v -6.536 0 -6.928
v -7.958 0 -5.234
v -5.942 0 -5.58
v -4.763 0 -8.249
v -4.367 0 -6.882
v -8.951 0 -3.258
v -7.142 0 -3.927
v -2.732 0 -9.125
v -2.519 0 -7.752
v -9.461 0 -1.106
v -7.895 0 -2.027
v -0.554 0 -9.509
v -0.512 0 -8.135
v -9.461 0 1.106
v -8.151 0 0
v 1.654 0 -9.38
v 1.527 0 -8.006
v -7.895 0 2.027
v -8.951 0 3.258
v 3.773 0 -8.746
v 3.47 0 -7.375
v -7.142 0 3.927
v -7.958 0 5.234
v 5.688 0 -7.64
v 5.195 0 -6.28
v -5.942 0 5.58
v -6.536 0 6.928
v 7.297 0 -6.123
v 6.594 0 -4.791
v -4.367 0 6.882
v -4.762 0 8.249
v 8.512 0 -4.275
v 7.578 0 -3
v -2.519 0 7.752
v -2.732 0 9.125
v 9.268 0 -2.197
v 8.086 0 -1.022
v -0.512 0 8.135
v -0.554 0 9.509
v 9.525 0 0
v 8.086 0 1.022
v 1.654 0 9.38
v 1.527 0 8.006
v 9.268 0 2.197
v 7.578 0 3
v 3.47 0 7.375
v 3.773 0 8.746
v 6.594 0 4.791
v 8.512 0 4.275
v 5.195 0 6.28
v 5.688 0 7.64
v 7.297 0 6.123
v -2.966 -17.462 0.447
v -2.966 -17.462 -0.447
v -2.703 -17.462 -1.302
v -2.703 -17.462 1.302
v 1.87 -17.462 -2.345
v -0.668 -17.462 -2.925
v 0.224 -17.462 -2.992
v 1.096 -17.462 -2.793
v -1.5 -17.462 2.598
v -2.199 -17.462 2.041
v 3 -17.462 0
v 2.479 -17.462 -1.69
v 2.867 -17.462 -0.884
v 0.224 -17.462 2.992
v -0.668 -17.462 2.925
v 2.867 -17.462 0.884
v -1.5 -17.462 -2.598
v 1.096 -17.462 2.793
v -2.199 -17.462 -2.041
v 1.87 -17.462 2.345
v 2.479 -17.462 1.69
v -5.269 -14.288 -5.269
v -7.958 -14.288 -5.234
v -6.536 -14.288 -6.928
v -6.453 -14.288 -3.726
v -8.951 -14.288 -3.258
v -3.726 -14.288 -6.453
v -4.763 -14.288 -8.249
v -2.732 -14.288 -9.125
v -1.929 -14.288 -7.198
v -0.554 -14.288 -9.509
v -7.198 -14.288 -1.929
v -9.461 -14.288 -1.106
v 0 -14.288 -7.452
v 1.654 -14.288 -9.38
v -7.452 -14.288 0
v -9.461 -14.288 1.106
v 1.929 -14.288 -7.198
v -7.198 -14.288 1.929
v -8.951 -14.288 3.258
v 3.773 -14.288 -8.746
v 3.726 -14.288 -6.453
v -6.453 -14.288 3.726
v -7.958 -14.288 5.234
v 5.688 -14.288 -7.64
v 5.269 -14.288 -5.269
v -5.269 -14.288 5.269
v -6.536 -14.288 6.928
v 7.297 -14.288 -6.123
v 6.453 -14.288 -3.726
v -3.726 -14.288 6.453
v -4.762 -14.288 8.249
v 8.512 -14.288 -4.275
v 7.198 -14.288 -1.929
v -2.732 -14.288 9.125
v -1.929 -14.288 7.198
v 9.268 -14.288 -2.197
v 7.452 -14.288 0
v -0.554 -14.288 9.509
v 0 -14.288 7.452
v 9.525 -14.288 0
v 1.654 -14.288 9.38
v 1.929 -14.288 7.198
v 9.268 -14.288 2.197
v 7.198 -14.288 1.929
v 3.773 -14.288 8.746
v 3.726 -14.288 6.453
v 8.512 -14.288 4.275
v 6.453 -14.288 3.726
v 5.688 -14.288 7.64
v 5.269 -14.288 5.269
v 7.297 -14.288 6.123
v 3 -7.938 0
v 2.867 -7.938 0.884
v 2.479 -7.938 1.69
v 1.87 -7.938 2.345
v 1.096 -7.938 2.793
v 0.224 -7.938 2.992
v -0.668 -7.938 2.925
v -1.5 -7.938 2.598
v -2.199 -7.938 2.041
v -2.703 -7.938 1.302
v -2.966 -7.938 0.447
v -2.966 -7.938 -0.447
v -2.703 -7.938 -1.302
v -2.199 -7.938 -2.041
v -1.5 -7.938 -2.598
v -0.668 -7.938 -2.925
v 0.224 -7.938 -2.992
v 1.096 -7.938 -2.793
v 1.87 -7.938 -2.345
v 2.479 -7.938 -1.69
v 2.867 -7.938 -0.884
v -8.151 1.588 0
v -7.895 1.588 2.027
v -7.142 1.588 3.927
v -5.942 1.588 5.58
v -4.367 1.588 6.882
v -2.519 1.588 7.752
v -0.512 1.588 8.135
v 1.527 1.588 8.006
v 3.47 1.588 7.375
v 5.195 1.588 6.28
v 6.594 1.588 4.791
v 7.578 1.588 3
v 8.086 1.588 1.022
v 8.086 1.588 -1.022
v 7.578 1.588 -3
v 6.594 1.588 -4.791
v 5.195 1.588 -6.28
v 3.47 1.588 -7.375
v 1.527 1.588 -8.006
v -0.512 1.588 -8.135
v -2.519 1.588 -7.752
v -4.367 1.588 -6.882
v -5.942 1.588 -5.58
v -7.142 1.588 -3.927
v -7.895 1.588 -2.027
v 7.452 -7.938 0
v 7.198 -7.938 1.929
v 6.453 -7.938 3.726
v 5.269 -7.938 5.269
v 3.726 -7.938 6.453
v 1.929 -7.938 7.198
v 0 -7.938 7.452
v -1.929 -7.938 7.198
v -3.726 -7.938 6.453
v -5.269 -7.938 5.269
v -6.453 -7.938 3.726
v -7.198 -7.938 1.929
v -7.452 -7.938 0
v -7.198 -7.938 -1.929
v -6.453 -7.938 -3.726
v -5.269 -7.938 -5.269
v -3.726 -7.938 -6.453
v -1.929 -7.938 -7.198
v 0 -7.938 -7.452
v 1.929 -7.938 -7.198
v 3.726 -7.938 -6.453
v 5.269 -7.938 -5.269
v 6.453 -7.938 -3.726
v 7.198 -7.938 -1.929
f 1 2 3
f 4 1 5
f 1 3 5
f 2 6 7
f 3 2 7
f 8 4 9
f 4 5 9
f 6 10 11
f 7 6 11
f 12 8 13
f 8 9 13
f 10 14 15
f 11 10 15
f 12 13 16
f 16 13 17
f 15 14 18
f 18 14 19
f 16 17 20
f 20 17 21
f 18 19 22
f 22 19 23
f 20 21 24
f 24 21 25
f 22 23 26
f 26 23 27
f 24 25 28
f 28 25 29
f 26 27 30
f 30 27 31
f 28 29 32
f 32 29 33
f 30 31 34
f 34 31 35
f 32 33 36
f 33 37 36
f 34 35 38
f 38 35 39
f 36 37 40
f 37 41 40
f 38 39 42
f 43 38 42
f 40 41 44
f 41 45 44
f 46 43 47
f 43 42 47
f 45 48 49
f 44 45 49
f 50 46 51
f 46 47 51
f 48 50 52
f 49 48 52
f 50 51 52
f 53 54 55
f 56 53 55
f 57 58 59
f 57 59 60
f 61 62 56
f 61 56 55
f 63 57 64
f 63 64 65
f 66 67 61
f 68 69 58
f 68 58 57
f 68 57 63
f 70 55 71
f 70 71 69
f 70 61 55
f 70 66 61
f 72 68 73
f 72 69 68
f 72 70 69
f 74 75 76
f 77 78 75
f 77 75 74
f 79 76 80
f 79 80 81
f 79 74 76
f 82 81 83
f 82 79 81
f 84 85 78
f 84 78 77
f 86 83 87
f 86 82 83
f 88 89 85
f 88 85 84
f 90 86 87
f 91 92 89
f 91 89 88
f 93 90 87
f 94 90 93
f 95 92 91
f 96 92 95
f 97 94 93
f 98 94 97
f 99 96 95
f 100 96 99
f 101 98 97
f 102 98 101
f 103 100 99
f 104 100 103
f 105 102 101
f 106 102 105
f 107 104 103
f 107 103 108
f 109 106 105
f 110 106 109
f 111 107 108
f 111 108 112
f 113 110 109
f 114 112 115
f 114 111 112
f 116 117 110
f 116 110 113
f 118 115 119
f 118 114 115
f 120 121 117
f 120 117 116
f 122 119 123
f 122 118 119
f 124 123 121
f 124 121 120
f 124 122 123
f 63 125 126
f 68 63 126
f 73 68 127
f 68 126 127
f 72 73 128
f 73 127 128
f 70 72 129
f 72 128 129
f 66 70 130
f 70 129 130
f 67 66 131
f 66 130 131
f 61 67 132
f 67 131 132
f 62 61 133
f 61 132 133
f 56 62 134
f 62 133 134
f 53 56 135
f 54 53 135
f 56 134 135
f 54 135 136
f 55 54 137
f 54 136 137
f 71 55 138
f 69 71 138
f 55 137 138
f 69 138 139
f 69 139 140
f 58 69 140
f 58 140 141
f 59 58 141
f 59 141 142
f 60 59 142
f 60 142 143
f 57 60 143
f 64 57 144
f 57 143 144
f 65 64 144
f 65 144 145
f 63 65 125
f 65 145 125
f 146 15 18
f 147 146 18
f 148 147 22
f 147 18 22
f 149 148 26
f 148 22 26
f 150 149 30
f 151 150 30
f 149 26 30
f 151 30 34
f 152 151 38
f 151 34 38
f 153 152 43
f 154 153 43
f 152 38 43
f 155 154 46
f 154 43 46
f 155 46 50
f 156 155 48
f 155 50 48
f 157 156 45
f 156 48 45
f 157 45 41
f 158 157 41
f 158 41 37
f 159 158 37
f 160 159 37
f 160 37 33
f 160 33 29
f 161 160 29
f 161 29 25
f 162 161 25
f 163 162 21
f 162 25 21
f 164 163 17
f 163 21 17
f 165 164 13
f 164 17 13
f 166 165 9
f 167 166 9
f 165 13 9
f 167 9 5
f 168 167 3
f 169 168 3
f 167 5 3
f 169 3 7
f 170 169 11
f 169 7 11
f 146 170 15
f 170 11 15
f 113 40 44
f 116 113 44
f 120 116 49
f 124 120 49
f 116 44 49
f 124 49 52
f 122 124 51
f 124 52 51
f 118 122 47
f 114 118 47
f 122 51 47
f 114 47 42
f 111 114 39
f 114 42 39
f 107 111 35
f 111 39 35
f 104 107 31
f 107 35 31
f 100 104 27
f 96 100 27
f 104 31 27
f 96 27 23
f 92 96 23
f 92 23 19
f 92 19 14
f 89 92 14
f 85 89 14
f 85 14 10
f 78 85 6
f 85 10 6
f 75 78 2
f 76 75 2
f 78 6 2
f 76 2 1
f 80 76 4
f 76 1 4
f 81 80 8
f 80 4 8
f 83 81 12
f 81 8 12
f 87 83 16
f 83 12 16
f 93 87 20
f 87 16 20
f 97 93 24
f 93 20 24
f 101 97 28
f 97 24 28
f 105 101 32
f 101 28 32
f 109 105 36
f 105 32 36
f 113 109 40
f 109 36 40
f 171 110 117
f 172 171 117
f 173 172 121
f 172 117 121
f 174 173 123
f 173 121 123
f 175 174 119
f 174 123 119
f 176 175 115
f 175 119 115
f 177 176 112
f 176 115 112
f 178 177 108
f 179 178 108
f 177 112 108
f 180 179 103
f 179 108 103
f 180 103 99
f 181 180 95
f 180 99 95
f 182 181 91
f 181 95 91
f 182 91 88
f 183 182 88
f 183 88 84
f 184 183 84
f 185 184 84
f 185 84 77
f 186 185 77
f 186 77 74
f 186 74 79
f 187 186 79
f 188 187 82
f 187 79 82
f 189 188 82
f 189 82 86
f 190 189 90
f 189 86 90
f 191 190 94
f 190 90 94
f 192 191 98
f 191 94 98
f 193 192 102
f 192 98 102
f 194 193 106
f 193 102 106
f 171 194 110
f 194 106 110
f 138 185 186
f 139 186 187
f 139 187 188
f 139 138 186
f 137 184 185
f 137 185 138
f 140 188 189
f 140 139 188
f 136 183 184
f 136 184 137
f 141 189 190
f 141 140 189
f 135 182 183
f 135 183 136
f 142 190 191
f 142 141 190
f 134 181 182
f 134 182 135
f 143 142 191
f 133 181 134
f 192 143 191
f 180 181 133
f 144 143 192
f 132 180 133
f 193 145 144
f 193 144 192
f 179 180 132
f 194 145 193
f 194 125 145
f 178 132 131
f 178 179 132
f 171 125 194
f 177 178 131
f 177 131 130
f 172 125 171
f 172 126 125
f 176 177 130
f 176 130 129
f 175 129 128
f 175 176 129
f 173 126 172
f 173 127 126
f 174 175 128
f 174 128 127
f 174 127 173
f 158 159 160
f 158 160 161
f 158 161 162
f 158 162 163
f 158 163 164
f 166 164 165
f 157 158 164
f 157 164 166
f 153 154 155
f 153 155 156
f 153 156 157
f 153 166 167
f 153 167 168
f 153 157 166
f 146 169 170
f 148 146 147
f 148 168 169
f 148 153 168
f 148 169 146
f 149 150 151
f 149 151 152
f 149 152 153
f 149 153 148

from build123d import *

# Parameters (mm, degrees)
F0_R     = 9.525
F1_DEPTH = 14.2875
F2_R     = 8.150668
F3_DEPTH = 1.5875
F4_R     = 7.451833
F5_DEPTH = 6.35
F6_R     = 3
F7_DEPTH = 9.525


with BuildPart() as f1:
    # F0 (on Front) → F1 (new body)
    with BuildSketch(Plane.XZ):
        Circle(F0_R)
    extrude(amount=F1_DEPTH)

    # F2 (on face) → F3 (join)
    with BuildSketch(Plane(origin=(0, 0, 0), x_dir=(-1, 0, 0), z_dir=(0, 1, 0))):
        Circle(F2_R)
    extrude(amount=F3_DEPTH)

    # F4 (on face) → F5 (cut)
    with BuildSketch(Plane.XZ.offset(14.2875)):
        Circle(F4_R)
    extrude(amount=-F5_DEPTH, mode=Mode.SUBTRACT)

    # F6 (on face) → F7 (join)
    with BuildSketch(Plane.XZ.offset(7.9375)):
        Circle(F6_R)
    extrude(amount=F7_DEPTH)


solid = f1.part
